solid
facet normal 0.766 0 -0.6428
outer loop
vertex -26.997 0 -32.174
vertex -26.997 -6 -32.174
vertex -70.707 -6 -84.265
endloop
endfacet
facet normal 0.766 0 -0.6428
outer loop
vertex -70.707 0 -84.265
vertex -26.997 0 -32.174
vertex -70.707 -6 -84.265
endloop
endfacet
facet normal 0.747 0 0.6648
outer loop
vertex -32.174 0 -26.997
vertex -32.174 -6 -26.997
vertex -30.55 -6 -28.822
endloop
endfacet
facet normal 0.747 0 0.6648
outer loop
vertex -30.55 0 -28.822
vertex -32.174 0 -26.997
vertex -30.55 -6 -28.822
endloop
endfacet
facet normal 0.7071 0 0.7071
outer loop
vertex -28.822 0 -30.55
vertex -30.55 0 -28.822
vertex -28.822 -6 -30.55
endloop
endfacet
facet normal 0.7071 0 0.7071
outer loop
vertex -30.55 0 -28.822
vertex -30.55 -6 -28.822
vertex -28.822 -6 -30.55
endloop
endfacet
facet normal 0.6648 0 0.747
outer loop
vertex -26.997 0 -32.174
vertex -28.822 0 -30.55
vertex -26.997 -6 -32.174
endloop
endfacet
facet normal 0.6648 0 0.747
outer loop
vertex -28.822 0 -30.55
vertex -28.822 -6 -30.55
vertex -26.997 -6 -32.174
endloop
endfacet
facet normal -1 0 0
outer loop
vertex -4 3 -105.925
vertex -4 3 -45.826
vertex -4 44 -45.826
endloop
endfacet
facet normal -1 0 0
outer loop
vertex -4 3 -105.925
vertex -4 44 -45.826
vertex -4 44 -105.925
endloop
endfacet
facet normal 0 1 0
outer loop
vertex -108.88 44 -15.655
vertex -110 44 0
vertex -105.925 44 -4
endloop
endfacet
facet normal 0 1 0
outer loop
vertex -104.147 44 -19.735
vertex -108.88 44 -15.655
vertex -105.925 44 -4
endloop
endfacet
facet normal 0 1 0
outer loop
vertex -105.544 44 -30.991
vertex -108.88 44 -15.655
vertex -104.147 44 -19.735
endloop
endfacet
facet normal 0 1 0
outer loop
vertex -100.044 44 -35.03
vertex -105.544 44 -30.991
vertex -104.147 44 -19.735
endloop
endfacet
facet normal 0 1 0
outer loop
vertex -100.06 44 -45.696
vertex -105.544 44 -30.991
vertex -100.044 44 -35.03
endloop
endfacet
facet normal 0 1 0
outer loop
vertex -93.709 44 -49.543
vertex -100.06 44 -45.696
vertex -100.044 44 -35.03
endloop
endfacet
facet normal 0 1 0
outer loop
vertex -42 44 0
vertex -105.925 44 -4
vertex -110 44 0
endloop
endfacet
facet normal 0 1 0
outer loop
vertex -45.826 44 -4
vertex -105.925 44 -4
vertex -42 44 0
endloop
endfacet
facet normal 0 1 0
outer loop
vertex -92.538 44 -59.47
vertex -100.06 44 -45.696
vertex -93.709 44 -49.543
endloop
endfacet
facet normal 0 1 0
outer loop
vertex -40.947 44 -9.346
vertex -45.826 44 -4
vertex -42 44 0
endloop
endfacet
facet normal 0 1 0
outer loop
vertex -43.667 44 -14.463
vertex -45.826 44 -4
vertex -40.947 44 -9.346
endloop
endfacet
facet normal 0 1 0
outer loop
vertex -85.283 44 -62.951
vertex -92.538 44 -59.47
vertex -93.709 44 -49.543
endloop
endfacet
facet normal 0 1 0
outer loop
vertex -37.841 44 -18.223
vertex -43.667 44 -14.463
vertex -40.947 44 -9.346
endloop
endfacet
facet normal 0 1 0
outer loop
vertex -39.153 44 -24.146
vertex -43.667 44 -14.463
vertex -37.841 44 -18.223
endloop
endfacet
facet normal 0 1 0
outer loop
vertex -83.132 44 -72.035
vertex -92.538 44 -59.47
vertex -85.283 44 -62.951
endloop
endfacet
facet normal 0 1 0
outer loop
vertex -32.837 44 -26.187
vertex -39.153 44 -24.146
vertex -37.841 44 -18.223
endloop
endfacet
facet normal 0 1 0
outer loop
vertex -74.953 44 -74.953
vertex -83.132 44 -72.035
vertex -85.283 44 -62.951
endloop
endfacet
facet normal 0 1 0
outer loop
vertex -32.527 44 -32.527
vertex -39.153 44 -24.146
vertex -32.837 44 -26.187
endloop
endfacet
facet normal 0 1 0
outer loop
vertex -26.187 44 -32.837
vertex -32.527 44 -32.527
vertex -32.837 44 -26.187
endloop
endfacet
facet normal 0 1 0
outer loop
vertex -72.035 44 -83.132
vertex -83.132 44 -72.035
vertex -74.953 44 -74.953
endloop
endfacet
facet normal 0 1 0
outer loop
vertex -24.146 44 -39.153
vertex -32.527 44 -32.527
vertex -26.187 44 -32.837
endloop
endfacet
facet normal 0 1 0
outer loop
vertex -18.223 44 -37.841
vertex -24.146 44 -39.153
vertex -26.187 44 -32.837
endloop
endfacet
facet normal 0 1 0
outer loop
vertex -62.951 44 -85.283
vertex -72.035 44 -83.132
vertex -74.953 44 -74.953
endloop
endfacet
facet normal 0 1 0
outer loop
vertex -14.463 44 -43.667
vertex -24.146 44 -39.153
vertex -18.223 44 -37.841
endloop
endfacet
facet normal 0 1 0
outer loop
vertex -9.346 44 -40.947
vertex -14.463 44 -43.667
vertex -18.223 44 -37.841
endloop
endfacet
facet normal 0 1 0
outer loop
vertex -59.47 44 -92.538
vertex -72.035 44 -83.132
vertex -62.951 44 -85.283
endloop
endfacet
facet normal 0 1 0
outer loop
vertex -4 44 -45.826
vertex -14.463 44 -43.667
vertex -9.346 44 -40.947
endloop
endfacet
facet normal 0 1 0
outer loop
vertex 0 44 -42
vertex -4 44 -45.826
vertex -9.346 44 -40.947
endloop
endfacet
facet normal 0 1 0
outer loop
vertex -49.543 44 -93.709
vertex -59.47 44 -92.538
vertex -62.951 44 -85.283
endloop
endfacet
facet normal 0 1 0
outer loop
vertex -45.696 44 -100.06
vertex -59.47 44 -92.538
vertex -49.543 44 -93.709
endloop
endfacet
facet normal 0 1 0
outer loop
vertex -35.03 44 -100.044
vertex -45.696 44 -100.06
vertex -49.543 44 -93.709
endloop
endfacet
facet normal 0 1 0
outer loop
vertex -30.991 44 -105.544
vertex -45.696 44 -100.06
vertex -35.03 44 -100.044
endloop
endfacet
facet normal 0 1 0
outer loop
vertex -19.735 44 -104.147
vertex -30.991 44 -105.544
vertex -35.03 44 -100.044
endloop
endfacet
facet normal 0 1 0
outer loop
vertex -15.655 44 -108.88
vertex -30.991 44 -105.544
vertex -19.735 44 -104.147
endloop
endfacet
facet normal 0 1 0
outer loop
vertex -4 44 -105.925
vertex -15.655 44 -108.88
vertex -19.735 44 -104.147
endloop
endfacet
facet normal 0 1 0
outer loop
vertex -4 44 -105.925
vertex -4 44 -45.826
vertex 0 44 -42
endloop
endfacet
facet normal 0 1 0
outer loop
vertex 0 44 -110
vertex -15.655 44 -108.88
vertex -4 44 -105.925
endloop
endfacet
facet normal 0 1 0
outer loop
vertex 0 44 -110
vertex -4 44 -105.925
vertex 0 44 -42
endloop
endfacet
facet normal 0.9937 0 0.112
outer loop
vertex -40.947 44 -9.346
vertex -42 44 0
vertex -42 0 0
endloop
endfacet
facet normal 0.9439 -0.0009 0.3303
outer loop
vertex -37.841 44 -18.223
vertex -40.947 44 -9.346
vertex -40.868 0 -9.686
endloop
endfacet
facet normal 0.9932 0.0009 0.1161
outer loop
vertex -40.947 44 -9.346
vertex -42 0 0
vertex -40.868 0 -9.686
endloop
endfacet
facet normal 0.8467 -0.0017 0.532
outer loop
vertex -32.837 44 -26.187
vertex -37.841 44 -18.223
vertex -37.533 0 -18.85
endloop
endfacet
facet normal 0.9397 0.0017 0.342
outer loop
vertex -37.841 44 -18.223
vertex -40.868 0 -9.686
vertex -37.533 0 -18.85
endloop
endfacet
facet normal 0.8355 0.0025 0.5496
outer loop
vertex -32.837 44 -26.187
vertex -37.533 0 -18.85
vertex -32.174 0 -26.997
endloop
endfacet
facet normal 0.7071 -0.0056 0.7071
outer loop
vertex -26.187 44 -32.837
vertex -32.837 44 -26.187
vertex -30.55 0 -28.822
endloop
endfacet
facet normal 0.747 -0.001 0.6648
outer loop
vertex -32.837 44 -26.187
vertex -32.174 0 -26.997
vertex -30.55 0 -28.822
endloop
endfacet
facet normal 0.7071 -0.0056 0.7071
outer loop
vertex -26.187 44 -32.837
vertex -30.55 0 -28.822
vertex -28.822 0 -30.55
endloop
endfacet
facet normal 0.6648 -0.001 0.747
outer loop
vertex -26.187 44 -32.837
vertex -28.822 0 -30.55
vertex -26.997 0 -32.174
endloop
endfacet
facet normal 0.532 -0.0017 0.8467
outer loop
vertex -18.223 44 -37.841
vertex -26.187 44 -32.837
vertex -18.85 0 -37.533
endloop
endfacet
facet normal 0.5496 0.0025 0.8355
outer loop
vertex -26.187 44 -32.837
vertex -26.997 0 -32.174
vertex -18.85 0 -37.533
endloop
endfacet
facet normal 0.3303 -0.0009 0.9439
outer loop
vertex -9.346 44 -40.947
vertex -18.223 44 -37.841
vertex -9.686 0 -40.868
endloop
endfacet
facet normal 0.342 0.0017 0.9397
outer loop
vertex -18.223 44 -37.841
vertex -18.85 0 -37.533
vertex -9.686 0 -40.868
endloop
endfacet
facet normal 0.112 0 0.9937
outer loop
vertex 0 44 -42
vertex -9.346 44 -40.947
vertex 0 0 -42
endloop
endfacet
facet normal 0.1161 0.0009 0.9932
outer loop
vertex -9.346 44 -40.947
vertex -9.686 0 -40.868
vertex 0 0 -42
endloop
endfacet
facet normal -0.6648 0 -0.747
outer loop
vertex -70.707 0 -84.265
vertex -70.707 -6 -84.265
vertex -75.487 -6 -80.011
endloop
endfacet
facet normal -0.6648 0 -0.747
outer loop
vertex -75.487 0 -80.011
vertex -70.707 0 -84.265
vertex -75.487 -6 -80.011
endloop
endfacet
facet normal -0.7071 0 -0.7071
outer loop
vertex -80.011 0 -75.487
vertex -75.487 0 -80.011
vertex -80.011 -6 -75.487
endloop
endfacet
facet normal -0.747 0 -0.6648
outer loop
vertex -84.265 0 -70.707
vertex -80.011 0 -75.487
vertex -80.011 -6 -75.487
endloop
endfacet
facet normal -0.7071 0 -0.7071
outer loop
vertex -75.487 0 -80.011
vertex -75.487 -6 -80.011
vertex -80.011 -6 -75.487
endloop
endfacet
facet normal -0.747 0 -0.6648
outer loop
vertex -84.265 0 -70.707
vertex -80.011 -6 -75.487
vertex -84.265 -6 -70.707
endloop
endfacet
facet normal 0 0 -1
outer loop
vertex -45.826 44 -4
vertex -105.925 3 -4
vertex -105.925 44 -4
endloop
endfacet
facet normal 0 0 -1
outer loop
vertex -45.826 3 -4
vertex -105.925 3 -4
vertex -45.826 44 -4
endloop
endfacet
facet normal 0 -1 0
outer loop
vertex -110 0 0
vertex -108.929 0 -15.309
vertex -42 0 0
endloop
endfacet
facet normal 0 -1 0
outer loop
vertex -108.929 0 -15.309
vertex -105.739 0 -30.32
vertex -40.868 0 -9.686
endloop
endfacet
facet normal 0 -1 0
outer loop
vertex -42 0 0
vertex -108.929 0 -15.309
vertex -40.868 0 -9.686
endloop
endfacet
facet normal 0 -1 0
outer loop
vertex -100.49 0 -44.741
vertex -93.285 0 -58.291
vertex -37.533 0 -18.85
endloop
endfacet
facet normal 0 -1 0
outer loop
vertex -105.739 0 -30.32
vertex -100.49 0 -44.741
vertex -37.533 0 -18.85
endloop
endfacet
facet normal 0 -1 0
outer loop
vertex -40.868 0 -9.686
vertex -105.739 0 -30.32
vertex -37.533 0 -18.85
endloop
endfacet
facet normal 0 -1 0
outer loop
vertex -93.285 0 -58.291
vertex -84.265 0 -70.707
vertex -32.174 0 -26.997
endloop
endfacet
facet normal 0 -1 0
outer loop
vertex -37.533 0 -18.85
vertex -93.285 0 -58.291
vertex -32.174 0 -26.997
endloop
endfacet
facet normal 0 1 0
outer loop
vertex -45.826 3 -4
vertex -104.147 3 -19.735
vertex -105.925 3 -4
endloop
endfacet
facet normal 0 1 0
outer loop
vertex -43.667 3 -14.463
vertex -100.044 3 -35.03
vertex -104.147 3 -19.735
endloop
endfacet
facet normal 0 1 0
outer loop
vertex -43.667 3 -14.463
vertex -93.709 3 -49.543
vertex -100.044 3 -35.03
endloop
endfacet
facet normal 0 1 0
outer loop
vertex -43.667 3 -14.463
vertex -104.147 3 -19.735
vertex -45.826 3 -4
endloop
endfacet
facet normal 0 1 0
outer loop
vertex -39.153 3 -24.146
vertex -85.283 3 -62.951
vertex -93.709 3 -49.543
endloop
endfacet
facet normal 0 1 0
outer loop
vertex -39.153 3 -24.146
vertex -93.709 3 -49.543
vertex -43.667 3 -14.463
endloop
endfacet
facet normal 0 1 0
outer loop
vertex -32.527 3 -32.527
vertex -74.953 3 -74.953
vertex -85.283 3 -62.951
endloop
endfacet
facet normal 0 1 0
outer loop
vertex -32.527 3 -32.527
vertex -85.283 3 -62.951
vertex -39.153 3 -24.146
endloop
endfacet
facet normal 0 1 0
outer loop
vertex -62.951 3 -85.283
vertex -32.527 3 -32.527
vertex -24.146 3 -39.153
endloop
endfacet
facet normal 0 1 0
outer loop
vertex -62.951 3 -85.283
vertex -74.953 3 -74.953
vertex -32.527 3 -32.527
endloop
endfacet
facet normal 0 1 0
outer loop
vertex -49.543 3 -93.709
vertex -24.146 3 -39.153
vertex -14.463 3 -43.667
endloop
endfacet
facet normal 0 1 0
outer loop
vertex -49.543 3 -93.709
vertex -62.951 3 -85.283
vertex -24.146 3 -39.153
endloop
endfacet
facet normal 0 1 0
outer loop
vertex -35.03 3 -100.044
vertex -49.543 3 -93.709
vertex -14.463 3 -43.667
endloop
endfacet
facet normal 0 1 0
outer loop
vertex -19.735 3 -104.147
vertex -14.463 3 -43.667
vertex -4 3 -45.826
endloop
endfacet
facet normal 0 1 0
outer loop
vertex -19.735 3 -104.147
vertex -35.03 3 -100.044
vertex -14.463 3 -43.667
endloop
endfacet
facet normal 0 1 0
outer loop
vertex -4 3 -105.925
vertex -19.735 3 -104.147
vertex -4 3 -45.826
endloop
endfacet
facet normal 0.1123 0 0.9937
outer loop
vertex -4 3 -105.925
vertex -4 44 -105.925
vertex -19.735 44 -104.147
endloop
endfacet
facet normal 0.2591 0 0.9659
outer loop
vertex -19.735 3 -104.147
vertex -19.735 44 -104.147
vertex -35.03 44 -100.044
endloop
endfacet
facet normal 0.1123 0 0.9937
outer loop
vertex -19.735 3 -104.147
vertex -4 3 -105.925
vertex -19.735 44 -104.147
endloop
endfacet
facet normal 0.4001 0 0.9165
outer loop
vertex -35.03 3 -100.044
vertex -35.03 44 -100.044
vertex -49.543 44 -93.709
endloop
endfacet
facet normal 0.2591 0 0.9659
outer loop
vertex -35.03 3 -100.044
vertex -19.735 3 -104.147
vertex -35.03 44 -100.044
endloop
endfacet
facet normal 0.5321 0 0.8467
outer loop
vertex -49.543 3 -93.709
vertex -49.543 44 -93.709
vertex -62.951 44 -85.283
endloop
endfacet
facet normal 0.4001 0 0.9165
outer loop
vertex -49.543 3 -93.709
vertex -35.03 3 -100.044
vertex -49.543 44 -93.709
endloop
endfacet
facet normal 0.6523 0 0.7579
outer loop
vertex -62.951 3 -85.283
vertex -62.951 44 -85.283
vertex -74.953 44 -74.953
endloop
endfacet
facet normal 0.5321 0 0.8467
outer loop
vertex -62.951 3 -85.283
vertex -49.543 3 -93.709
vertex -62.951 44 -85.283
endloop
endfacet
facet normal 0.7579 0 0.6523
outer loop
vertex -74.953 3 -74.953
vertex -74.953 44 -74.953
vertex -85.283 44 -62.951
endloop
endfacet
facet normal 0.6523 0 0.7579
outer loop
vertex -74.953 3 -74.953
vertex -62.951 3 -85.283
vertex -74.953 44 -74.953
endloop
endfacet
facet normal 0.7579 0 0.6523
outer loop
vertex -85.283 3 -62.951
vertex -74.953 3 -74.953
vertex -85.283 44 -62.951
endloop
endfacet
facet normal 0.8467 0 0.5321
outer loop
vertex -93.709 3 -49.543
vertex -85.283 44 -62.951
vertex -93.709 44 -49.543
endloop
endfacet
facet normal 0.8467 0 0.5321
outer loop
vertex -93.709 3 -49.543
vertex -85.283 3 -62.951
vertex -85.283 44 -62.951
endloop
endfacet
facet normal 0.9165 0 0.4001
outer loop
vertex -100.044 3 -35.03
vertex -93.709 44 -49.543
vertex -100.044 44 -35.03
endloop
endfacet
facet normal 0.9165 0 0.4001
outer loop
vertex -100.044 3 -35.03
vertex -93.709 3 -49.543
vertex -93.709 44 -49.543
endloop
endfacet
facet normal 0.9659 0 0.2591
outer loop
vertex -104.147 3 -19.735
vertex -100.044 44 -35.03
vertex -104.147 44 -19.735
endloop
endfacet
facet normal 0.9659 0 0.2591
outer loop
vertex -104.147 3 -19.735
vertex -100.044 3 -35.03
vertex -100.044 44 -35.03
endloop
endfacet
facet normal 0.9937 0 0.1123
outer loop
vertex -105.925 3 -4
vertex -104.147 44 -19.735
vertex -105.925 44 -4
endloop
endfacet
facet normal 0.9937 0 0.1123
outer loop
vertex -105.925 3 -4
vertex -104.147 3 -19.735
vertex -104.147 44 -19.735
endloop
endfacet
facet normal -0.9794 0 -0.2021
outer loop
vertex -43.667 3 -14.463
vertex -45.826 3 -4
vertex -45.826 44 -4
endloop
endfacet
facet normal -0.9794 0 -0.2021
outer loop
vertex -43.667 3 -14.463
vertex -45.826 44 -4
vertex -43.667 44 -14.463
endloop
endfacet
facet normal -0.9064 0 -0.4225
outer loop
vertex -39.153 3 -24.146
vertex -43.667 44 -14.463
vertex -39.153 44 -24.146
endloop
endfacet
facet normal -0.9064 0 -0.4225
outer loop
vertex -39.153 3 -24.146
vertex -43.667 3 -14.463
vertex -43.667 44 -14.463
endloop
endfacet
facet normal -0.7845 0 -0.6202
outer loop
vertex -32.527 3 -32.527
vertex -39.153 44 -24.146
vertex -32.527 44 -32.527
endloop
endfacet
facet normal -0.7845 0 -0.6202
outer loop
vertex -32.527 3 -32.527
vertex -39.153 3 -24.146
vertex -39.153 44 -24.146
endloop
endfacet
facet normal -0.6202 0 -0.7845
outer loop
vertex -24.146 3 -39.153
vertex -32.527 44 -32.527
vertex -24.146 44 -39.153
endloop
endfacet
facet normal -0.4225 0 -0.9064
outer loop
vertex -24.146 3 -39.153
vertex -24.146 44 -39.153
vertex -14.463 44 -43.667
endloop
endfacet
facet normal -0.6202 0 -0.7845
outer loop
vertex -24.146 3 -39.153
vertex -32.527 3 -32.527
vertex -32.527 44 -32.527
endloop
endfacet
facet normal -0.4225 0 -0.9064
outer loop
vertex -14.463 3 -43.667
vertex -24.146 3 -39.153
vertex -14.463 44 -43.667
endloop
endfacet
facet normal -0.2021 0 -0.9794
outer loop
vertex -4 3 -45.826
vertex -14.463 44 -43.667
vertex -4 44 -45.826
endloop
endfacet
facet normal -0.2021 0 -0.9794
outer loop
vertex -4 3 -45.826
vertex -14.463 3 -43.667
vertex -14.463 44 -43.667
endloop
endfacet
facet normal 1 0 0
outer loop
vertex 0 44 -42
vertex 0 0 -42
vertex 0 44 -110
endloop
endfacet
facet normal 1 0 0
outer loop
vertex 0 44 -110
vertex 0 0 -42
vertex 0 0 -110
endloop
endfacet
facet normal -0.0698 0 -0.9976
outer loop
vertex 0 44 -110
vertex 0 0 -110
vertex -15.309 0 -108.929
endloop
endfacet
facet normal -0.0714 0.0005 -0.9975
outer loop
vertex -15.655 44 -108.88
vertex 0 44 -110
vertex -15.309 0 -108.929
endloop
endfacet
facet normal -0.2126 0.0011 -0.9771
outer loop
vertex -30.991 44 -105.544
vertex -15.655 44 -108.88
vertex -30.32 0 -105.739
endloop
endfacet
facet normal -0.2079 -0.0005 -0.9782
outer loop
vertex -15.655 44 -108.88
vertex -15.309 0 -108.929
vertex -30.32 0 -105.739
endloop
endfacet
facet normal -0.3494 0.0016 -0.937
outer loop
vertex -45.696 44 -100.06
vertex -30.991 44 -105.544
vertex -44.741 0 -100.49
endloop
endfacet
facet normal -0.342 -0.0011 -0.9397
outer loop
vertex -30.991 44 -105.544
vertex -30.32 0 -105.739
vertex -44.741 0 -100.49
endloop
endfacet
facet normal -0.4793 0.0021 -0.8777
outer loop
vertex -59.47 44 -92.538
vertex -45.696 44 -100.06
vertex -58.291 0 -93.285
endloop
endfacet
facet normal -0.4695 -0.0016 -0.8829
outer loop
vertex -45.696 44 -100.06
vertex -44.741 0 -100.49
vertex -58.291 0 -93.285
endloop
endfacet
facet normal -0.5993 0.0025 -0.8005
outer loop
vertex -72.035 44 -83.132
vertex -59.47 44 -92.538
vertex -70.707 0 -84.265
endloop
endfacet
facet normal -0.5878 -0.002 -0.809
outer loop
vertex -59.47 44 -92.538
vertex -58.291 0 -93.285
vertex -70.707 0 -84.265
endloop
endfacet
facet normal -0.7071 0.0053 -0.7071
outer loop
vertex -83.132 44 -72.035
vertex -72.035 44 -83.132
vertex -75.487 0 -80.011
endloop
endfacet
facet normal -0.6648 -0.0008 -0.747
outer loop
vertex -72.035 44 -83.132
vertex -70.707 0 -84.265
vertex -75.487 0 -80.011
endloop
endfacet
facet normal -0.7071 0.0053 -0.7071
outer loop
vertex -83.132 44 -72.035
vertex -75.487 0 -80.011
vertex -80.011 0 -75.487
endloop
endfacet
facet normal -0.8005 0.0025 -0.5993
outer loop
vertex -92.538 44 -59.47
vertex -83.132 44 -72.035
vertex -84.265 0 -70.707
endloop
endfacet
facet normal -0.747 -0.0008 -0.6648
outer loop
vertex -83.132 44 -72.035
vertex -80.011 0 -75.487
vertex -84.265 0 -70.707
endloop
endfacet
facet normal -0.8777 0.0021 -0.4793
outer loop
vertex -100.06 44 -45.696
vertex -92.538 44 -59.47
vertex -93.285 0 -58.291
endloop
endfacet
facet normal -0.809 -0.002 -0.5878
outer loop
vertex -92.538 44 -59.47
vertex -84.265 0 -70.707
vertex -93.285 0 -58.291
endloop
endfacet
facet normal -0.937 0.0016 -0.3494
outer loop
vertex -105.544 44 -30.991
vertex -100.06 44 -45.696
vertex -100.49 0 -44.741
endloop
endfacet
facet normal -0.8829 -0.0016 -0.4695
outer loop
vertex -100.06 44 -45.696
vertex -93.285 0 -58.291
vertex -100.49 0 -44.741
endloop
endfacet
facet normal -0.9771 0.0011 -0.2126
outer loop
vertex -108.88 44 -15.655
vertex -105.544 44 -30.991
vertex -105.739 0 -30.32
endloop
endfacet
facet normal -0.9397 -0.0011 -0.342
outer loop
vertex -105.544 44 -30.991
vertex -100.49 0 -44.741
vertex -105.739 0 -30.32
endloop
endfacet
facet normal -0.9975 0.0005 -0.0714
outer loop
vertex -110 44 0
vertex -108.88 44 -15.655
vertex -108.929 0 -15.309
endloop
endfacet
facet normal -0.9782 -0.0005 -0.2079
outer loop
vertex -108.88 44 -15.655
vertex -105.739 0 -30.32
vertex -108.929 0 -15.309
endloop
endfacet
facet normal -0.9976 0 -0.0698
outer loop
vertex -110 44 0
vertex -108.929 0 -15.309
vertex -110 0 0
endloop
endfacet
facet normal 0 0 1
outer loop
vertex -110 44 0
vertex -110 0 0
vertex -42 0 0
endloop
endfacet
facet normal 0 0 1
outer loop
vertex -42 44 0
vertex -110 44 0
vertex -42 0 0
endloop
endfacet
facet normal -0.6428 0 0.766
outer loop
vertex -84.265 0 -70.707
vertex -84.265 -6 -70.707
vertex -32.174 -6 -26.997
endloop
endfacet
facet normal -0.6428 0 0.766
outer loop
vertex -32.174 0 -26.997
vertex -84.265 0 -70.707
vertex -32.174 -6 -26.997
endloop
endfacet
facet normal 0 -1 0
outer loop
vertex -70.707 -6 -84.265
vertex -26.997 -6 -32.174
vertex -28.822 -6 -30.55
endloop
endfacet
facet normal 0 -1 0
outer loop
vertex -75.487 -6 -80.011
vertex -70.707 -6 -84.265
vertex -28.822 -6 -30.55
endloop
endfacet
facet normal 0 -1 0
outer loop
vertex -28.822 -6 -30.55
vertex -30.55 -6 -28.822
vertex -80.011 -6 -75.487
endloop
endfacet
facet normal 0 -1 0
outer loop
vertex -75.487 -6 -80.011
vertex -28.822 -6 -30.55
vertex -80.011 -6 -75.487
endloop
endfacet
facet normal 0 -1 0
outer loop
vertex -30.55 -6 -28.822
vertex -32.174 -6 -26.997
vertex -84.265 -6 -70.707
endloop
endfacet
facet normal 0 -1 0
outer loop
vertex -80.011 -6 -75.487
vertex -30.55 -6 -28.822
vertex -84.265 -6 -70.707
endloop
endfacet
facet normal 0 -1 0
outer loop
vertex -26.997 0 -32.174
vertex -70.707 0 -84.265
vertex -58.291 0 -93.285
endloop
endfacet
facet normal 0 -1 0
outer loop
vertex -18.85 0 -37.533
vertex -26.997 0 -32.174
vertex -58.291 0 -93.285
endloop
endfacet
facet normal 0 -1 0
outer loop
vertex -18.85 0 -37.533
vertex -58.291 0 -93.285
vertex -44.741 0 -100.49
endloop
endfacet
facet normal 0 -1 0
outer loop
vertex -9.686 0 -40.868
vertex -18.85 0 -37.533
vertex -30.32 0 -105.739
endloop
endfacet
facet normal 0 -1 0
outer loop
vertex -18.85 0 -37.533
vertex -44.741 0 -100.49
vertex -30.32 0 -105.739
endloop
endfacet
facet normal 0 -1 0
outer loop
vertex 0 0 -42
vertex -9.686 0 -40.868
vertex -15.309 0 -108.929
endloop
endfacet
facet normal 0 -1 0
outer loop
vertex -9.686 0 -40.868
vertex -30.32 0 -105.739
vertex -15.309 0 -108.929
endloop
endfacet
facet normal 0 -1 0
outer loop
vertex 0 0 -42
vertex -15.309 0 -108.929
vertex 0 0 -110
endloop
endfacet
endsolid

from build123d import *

# Parameters (mm, degrees)
ESTRUSIONE_ESTRUSIONE1_DEPTH = 3
ESTRUSIONE_SOTTILE1_DEPTH    = 44
ESTRUSIONE_ESTRUSIONE2_START = 6
ESTRUSIONE_ESTRUSIONE2_DEPTH = 6


with BuildPart() as part:
    # Schizzo1 → Estrusione-Estrusione1 (new body)
    with BuildSketch(Plane(origin=(0, 0, 0), x_dir=(1, 0, 0), z_dir=(0, 1, 0))):
        with BuildLine():
            Line((-110, 0), (-42, 0))
            ThreePointArc((-42, 0), (-29.69848481, 29.69848481), (0, 42))
            Line((0, 42), (0, 110))
            ThreePointArc((0, 110), (-77.781745931, 77.781745931), (-110, 0))
        make_face()
    extrude(amount=ESTRUSIONE_ESTRUSIONE1_DEPTH)

    # Schizzo1<2> → Estrusione-Sottile1 (add)
    with BuildSketch(Plane(origin=(0, 0, 0), x_dir=(1, 0, 0), z_dir=(0, 1, 0))):
        with BuildLine():
            Line((0, 42), (0, 110))
            ThreePointArc((0, 110), (-77.781745931, 77.781745931), (-110, 0))
            Line((-110, 0), (-42, 0))
            ThreePointArc((-42, 0), (-29.69848481, 29.69848481), (0, 42))
        make_face()
        with BuildLine():
            Line((-4, 45.82575695), (-4, 105.924501415))
            ThreePointArc((-4, 105.924501415), (-74.953318806, 74.953318806), (-105.924501415, 4))
            Line((-105.924501415, 4), (-45.82575695, 4))
            ThreePointArc((-45.82575695, 4), (-32.526911935, 32.526911935), (-4, 45.82575695))
        make_face(mode=Mode.SUBTRACT)
    extrude(amount=ESTRUSIONE_SOTTILE1_DEPTH)

    # Schizzo2 → Estrusione-Estrusione2 (add)
    with BuildSketch(Plane.XZ.offset(ESTRUSIONE_ESTRUSIONE2_START)):
        with BuildLine():
            Line((-84.264888743, -70.706637066), (-32.173866611, -26.997079607))
            ThreePointArc((-32.173866611, -26.997079607), (-29.69848481, -29.69848481), (-26.997079607, -32.173866611))
            Line((-26.997079607, -32.173866611), (-70.706637066, -84.264888743))
            ThreePointArc((-70.706637066, -84.264888743), (-77.781745931, -77.781745931), (-84.264888743, -70.706637066))
        make_face()
    extrude(amount=-ESTRUSIONE_ESTRUSIONE2_DEPTH)


solid = part.part
